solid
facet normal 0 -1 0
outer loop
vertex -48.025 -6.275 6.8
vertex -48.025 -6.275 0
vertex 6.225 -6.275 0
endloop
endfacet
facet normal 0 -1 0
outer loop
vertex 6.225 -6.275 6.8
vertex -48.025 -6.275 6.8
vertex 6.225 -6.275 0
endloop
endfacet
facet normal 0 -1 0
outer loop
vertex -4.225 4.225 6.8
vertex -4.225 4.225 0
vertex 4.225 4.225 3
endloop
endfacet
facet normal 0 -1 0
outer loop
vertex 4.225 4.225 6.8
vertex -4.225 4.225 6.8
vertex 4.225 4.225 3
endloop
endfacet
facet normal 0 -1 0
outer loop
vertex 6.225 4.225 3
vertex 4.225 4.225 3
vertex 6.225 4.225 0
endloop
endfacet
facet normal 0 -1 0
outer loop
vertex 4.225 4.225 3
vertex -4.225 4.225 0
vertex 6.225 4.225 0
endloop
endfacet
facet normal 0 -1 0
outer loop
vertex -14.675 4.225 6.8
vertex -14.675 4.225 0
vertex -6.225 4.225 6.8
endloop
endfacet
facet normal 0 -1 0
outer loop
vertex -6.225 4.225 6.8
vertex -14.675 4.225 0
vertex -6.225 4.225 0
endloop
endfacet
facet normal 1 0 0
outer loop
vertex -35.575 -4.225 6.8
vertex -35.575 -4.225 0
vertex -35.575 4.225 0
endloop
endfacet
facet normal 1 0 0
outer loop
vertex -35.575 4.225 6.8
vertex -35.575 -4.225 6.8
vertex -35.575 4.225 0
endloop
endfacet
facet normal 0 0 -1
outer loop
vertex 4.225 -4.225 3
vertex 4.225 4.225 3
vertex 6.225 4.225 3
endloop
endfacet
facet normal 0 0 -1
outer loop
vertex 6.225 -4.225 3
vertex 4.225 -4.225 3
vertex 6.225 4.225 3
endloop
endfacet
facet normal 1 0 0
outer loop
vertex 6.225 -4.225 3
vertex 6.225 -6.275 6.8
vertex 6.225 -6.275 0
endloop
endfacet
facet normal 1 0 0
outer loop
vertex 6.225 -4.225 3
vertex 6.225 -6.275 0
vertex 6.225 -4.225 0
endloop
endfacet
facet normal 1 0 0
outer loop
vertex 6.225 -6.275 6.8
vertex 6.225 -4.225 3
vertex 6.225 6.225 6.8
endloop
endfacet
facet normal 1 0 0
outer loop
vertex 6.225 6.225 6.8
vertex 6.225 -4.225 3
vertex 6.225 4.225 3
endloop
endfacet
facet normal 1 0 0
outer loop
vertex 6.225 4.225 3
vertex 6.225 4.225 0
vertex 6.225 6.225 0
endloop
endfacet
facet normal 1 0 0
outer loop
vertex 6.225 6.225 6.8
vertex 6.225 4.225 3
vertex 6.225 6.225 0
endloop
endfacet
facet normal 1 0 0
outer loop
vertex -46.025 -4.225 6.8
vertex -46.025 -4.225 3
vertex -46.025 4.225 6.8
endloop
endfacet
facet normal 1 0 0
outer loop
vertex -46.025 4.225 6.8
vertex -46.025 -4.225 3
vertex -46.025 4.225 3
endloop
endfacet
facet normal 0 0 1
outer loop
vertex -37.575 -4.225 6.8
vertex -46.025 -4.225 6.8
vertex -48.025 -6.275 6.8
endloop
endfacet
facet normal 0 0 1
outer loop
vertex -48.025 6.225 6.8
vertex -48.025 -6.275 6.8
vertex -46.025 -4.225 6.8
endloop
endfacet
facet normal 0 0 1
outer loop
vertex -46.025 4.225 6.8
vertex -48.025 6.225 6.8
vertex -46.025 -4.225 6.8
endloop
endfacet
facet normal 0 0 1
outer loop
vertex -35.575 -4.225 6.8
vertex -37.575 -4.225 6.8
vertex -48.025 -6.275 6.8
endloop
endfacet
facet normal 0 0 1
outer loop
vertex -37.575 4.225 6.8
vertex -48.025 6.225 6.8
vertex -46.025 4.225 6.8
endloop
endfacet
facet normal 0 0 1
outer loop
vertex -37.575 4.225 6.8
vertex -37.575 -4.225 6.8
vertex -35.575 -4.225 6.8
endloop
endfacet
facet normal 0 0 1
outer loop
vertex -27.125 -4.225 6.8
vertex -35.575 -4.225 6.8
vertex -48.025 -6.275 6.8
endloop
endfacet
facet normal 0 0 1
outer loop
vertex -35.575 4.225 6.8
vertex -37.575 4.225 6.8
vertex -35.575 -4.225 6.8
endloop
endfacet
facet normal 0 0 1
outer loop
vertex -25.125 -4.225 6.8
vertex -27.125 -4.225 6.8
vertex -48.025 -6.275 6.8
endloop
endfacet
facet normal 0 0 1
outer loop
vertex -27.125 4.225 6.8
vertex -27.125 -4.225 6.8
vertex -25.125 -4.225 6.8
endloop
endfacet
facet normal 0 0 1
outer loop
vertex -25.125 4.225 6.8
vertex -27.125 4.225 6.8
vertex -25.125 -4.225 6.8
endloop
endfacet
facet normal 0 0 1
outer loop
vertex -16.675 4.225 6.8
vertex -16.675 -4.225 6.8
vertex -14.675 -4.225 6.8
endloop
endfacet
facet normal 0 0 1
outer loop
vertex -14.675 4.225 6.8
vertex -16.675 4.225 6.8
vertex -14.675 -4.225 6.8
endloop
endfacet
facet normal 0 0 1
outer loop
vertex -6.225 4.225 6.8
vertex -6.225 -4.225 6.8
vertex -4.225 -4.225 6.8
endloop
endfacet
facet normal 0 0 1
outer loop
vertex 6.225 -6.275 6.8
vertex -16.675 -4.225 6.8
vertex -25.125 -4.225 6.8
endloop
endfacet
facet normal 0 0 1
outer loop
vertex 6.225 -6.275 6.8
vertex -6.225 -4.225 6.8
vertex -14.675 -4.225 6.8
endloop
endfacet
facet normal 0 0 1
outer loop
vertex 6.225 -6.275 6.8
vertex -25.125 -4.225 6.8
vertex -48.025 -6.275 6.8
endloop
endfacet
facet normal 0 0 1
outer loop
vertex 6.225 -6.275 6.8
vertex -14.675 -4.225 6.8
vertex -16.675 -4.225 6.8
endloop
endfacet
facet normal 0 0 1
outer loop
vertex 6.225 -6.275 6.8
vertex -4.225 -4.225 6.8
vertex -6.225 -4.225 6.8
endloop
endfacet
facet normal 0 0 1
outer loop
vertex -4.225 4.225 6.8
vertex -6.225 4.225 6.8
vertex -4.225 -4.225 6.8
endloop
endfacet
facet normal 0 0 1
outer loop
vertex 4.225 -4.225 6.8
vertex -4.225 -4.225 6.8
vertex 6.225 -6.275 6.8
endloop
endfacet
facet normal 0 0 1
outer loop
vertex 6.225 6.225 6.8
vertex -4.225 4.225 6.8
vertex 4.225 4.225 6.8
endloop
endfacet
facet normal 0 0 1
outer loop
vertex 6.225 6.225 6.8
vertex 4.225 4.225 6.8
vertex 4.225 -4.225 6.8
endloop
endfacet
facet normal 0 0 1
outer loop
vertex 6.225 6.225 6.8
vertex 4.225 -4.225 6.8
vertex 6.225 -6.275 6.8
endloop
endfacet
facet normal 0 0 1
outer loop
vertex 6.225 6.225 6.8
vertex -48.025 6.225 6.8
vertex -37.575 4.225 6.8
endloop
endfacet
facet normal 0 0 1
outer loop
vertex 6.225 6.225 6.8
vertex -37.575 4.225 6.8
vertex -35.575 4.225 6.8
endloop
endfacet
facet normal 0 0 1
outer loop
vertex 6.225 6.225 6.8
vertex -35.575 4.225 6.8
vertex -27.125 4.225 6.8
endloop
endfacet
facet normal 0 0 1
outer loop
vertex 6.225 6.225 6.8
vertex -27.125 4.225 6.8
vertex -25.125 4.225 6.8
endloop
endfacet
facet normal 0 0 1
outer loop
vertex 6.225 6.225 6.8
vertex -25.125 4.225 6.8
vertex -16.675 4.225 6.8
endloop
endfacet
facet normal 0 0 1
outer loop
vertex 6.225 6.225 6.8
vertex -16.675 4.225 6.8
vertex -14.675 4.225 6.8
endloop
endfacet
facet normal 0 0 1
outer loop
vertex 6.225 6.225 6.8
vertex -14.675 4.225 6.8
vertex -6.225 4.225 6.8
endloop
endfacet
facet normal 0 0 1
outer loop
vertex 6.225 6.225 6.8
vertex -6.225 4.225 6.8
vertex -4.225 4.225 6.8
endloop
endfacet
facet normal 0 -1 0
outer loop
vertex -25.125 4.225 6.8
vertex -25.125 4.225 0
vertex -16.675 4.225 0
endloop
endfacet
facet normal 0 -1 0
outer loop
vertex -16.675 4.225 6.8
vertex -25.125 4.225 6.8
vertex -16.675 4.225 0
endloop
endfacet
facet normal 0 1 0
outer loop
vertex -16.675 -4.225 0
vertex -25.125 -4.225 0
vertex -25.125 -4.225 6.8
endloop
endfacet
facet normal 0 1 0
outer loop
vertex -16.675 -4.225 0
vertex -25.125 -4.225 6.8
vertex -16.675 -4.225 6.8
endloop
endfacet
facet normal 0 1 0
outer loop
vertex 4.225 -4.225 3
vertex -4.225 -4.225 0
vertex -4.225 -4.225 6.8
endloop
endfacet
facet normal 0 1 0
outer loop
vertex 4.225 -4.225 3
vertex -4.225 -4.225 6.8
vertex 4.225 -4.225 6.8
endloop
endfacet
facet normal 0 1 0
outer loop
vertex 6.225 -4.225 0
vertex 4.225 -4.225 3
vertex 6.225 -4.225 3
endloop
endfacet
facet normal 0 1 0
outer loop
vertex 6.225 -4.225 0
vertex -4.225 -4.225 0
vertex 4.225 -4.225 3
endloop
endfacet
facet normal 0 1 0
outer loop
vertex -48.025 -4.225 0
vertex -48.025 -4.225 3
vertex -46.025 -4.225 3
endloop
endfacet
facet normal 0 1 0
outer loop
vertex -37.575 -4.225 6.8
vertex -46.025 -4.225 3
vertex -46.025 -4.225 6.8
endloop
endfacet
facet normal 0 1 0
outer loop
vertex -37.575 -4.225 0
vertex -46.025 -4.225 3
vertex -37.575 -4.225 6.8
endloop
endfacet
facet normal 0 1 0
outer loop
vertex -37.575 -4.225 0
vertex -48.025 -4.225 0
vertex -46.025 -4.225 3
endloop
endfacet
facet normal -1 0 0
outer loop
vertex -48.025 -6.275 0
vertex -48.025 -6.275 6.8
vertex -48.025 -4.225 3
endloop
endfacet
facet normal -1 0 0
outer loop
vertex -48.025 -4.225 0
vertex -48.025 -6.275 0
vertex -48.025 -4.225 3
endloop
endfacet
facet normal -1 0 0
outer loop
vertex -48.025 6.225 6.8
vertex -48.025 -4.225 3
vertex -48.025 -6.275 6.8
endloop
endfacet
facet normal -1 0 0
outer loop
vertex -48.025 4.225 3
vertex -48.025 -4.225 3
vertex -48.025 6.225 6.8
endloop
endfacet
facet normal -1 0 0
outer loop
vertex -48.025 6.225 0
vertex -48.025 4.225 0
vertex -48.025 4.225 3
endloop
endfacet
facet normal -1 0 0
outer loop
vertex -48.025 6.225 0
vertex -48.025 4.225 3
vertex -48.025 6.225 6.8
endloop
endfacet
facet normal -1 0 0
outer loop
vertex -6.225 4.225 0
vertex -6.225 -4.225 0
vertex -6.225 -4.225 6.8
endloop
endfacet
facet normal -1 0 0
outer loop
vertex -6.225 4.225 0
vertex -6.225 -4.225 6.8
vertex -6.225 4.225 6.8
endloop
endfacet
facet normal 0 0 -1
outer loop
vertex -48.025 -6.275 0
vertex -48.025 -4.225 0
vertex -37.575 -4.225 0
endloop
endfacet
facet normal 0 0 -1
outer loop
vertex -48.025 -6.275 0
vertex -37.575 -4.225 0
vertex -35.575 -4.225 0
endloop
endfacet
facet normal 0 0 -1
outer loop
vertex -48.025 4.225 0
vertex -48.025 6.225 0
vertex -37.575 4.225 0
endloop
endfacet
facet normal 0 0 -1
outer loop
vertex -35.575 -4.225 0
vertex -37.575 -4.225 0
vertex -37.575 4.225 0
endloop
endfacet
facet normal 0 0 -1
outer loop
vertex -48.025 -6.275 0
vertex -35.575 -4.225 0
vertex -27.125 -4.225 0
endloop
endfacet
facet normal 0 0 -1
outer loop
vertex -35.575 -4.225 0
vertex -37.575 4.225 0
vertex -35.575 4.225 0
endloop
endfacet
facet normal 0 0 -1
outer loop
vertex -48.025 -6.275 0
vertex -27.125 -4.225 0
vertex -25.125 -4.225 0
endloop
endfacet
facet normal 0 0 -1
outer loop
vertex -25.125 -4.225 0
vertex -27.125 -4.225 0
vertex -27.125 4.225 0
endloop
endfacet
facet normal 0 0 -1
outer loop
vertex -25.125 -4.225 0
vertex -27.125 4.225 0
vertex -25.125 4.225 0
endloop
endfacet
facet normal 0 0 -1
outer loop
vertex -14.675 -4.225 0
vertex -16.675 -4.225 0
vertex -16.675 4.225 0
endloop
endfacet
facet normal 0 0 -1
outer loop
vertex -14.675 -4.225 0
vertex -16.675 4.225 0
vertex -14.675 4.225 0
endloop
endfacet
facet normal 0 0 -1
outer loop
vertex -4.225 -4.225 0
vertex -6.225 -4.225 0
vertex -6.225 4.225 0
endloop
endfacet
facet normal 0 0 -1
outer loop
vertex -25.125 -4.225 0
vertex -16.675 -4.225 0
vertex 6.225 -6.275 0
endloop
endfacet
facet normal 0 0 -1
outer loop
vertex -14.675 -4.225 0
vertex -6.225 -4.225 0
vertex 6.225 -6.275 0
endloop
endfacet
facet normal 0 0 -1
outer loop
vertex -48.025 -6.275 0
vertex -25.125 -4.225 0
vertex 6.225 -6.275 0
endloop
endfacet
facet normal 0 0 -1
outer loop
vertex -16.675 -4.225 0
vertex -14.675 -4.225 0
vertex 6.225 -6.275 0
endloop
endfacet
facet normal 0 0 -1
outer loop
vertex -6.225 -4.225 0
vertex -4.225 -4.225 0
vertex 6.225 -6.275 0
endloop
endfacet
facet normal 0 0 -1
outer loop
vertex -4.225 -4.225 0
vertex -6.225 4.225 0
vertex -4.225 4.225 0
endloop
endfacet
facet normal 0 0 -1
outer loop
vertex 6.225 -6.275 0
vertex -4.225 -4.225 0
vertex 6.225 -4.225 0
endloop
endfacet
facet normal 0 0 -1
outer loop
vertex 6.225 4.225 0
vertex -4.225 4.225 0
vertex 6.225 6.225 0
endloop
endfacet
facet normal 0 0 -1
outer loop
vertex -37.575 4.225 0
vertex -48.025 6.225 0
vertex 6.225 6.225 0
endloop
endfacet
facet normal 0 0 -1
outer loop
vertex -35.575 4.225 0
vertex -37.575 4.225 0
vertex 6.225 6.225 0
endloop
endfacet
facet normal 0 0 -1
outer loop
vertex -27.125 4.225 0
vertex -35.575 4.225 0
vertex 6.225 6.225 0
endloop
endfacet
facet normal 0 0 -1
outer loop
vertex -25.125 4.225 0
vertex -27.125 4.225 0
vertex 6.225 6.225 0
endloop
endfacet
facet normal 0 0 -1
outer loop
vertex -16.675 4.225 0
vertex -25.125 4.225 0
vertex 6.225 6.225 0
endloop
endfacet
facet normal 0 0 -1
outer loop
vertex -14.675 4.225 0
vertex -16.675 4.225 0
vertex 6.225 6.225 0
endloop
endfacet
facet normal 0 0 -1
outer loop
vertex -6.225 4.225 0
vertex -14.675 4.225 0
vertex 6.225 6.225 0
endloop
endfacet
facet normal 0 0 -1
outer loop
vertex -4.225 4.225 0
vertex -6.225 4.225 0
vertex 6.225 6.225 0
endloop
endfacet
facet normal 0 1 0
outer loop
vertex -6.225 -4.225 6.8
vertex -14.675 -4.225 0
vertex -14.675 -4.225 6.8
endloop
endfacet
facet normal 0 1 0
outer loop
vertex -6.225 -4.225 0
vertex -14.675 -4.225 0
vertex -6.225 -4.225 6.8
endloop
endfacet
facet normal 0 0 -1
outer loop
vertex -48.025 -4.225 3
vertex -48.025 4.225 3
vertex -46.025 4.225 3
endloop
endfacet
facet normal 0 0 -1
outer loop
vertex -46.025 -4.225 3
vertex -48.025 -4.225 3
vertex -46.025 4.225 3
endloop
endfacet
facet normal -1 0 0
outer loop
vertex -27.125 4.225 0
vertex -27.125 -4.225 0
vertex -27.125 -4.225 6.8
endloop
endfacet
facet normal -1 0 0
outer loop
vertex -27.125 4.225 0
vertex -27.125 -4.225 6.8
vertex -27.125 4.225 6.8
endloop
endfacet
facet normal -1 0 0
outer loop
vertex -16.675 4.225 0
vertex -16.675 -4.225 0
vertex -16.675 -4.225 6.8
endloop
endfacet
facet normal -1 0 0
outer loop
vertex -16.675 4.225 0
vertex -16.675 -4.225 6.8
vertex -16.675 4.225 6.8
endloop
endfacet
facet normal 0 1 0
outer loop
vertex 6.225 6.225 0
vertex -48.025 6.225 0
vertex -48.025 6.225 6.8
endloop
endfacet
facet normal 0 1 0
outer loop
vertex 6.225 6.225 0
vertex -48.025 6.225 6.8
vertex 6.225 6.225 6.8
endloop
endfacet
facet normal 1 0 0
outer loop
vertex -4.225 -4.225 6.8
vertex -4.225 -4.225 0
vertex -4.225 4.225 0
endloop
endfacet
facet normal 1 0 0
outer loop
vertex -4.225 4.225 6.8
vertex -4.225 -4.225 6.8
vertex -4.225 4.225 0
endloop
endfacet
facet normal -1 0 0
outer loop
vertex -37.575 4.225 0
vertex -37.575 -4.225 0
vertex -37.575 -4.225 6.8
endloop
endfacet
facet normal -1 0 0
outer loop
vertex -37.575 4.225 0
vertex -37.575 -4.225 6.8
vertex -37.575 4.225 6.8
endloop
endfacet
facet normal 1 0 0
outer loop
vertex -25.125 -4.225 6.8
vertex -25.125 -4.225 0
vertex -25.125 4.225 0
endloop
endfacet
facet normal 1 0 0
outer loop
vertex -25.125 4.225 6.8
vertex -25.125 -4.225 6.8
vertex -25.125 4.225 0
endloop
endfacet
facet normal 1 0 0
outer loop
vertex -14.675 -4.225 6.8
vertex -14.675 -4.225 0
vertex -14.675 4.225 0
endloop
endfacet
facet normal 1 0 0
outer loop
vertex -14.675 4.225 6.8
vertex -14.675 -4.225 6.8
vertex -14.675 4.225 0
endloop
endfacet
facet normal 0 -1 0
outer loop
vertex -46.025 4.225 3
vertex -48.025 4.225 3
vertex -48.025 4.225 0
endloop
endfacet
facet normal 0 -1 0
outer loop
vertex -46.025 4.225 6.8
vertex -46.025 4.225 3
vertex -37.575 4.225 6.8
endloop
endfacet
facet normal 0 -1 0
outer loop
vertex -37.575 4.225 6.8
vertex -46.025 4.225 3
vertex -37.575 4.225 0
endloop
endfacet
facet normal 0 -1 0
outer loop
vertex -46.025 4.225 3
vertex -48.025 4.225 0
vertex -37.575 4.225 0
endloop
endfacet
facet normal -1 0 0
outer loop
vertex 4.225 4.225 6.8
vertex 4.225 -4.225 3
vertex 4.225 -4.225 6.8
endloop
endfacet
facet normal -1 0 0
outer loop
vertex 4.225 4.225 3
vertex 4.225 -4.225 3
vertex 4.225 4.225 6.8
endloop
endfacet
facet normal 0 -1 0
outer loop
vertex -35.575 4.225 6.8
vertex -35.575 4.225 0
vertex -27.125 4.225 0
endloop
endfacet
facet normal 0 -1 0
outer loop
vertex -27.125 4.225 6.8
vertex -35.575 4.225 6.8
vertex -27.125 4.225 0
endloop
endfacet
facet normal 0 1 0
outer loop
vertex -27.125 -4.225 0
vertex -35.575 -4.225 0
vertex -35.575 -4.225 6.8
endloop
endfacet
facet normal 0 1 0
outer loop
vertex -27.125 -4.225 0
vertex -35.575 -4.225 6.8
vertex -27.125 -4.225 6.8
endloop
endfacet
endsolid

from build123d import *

# Parameters (mm, degrees)
SKETCH001_W      = 8.45
SKETCH001_H      = 8.45
EXTRUDE001_DEPTH = 3
SKETCH_W         = 54.25
SKETCH_H         = 12.5
SKETCH_W_2       = 8.45
SKETCH_H_2       = 8.45
EXTRUDE_DEPTH    = 6.8


with BuildPart() as extrude001:
    # Sketch001 → Extrude001 (new body)
    with BuildSketch(Plane.XY):
        with Locations((-45.5, 0)):
            Rectangle(SKETCH001_W, SKETCH001_H)
        with Locations((8, 0)):
            Rectangle(SKETCH001_W, SKETCH001_H)
    extrude(amount=EXTRUDE001_DEPTH)


with BuildPart() as cut:
    # Sketch → Extrude (new body)
    with BuildSketch(Plane.XY):
        with Locations((-20.9, -0.025)):
            Rectangle(SKETCH_W, SKETCH_H)
        Rectangle(SKETCH_W_2, SKETCH_H_2, mode=Mode.SUBTRACT)
        with Locations((-10.45, 0)):
            Rectangle(SKETCH_W_2, SKETCH_H_2, mode=Mode.SUBTRACT)
        with Locations((-20.9, 0)):
            Rectangle(SKETCH_W_2, SKETCH_H_2, mode=Mode.SUBTRACT)
        with Locations((-31.35, 0)):
            Rectangle(SKETCH_W_2, SKETCH_H_2, mode=Mode.SUBTRACT)
        with Locations((-41.8, 0)):
            Rectangle(SKETCH_W_2, SKETCH_H_2, mode=Mode.SUBTRACT)
    extrude(amount=EXTRUDE_DEPTH)

    # Cut: cut Extrude001
    add(extrude001.part, mode=Mode.SUBTRACT)


solid = cut.part
